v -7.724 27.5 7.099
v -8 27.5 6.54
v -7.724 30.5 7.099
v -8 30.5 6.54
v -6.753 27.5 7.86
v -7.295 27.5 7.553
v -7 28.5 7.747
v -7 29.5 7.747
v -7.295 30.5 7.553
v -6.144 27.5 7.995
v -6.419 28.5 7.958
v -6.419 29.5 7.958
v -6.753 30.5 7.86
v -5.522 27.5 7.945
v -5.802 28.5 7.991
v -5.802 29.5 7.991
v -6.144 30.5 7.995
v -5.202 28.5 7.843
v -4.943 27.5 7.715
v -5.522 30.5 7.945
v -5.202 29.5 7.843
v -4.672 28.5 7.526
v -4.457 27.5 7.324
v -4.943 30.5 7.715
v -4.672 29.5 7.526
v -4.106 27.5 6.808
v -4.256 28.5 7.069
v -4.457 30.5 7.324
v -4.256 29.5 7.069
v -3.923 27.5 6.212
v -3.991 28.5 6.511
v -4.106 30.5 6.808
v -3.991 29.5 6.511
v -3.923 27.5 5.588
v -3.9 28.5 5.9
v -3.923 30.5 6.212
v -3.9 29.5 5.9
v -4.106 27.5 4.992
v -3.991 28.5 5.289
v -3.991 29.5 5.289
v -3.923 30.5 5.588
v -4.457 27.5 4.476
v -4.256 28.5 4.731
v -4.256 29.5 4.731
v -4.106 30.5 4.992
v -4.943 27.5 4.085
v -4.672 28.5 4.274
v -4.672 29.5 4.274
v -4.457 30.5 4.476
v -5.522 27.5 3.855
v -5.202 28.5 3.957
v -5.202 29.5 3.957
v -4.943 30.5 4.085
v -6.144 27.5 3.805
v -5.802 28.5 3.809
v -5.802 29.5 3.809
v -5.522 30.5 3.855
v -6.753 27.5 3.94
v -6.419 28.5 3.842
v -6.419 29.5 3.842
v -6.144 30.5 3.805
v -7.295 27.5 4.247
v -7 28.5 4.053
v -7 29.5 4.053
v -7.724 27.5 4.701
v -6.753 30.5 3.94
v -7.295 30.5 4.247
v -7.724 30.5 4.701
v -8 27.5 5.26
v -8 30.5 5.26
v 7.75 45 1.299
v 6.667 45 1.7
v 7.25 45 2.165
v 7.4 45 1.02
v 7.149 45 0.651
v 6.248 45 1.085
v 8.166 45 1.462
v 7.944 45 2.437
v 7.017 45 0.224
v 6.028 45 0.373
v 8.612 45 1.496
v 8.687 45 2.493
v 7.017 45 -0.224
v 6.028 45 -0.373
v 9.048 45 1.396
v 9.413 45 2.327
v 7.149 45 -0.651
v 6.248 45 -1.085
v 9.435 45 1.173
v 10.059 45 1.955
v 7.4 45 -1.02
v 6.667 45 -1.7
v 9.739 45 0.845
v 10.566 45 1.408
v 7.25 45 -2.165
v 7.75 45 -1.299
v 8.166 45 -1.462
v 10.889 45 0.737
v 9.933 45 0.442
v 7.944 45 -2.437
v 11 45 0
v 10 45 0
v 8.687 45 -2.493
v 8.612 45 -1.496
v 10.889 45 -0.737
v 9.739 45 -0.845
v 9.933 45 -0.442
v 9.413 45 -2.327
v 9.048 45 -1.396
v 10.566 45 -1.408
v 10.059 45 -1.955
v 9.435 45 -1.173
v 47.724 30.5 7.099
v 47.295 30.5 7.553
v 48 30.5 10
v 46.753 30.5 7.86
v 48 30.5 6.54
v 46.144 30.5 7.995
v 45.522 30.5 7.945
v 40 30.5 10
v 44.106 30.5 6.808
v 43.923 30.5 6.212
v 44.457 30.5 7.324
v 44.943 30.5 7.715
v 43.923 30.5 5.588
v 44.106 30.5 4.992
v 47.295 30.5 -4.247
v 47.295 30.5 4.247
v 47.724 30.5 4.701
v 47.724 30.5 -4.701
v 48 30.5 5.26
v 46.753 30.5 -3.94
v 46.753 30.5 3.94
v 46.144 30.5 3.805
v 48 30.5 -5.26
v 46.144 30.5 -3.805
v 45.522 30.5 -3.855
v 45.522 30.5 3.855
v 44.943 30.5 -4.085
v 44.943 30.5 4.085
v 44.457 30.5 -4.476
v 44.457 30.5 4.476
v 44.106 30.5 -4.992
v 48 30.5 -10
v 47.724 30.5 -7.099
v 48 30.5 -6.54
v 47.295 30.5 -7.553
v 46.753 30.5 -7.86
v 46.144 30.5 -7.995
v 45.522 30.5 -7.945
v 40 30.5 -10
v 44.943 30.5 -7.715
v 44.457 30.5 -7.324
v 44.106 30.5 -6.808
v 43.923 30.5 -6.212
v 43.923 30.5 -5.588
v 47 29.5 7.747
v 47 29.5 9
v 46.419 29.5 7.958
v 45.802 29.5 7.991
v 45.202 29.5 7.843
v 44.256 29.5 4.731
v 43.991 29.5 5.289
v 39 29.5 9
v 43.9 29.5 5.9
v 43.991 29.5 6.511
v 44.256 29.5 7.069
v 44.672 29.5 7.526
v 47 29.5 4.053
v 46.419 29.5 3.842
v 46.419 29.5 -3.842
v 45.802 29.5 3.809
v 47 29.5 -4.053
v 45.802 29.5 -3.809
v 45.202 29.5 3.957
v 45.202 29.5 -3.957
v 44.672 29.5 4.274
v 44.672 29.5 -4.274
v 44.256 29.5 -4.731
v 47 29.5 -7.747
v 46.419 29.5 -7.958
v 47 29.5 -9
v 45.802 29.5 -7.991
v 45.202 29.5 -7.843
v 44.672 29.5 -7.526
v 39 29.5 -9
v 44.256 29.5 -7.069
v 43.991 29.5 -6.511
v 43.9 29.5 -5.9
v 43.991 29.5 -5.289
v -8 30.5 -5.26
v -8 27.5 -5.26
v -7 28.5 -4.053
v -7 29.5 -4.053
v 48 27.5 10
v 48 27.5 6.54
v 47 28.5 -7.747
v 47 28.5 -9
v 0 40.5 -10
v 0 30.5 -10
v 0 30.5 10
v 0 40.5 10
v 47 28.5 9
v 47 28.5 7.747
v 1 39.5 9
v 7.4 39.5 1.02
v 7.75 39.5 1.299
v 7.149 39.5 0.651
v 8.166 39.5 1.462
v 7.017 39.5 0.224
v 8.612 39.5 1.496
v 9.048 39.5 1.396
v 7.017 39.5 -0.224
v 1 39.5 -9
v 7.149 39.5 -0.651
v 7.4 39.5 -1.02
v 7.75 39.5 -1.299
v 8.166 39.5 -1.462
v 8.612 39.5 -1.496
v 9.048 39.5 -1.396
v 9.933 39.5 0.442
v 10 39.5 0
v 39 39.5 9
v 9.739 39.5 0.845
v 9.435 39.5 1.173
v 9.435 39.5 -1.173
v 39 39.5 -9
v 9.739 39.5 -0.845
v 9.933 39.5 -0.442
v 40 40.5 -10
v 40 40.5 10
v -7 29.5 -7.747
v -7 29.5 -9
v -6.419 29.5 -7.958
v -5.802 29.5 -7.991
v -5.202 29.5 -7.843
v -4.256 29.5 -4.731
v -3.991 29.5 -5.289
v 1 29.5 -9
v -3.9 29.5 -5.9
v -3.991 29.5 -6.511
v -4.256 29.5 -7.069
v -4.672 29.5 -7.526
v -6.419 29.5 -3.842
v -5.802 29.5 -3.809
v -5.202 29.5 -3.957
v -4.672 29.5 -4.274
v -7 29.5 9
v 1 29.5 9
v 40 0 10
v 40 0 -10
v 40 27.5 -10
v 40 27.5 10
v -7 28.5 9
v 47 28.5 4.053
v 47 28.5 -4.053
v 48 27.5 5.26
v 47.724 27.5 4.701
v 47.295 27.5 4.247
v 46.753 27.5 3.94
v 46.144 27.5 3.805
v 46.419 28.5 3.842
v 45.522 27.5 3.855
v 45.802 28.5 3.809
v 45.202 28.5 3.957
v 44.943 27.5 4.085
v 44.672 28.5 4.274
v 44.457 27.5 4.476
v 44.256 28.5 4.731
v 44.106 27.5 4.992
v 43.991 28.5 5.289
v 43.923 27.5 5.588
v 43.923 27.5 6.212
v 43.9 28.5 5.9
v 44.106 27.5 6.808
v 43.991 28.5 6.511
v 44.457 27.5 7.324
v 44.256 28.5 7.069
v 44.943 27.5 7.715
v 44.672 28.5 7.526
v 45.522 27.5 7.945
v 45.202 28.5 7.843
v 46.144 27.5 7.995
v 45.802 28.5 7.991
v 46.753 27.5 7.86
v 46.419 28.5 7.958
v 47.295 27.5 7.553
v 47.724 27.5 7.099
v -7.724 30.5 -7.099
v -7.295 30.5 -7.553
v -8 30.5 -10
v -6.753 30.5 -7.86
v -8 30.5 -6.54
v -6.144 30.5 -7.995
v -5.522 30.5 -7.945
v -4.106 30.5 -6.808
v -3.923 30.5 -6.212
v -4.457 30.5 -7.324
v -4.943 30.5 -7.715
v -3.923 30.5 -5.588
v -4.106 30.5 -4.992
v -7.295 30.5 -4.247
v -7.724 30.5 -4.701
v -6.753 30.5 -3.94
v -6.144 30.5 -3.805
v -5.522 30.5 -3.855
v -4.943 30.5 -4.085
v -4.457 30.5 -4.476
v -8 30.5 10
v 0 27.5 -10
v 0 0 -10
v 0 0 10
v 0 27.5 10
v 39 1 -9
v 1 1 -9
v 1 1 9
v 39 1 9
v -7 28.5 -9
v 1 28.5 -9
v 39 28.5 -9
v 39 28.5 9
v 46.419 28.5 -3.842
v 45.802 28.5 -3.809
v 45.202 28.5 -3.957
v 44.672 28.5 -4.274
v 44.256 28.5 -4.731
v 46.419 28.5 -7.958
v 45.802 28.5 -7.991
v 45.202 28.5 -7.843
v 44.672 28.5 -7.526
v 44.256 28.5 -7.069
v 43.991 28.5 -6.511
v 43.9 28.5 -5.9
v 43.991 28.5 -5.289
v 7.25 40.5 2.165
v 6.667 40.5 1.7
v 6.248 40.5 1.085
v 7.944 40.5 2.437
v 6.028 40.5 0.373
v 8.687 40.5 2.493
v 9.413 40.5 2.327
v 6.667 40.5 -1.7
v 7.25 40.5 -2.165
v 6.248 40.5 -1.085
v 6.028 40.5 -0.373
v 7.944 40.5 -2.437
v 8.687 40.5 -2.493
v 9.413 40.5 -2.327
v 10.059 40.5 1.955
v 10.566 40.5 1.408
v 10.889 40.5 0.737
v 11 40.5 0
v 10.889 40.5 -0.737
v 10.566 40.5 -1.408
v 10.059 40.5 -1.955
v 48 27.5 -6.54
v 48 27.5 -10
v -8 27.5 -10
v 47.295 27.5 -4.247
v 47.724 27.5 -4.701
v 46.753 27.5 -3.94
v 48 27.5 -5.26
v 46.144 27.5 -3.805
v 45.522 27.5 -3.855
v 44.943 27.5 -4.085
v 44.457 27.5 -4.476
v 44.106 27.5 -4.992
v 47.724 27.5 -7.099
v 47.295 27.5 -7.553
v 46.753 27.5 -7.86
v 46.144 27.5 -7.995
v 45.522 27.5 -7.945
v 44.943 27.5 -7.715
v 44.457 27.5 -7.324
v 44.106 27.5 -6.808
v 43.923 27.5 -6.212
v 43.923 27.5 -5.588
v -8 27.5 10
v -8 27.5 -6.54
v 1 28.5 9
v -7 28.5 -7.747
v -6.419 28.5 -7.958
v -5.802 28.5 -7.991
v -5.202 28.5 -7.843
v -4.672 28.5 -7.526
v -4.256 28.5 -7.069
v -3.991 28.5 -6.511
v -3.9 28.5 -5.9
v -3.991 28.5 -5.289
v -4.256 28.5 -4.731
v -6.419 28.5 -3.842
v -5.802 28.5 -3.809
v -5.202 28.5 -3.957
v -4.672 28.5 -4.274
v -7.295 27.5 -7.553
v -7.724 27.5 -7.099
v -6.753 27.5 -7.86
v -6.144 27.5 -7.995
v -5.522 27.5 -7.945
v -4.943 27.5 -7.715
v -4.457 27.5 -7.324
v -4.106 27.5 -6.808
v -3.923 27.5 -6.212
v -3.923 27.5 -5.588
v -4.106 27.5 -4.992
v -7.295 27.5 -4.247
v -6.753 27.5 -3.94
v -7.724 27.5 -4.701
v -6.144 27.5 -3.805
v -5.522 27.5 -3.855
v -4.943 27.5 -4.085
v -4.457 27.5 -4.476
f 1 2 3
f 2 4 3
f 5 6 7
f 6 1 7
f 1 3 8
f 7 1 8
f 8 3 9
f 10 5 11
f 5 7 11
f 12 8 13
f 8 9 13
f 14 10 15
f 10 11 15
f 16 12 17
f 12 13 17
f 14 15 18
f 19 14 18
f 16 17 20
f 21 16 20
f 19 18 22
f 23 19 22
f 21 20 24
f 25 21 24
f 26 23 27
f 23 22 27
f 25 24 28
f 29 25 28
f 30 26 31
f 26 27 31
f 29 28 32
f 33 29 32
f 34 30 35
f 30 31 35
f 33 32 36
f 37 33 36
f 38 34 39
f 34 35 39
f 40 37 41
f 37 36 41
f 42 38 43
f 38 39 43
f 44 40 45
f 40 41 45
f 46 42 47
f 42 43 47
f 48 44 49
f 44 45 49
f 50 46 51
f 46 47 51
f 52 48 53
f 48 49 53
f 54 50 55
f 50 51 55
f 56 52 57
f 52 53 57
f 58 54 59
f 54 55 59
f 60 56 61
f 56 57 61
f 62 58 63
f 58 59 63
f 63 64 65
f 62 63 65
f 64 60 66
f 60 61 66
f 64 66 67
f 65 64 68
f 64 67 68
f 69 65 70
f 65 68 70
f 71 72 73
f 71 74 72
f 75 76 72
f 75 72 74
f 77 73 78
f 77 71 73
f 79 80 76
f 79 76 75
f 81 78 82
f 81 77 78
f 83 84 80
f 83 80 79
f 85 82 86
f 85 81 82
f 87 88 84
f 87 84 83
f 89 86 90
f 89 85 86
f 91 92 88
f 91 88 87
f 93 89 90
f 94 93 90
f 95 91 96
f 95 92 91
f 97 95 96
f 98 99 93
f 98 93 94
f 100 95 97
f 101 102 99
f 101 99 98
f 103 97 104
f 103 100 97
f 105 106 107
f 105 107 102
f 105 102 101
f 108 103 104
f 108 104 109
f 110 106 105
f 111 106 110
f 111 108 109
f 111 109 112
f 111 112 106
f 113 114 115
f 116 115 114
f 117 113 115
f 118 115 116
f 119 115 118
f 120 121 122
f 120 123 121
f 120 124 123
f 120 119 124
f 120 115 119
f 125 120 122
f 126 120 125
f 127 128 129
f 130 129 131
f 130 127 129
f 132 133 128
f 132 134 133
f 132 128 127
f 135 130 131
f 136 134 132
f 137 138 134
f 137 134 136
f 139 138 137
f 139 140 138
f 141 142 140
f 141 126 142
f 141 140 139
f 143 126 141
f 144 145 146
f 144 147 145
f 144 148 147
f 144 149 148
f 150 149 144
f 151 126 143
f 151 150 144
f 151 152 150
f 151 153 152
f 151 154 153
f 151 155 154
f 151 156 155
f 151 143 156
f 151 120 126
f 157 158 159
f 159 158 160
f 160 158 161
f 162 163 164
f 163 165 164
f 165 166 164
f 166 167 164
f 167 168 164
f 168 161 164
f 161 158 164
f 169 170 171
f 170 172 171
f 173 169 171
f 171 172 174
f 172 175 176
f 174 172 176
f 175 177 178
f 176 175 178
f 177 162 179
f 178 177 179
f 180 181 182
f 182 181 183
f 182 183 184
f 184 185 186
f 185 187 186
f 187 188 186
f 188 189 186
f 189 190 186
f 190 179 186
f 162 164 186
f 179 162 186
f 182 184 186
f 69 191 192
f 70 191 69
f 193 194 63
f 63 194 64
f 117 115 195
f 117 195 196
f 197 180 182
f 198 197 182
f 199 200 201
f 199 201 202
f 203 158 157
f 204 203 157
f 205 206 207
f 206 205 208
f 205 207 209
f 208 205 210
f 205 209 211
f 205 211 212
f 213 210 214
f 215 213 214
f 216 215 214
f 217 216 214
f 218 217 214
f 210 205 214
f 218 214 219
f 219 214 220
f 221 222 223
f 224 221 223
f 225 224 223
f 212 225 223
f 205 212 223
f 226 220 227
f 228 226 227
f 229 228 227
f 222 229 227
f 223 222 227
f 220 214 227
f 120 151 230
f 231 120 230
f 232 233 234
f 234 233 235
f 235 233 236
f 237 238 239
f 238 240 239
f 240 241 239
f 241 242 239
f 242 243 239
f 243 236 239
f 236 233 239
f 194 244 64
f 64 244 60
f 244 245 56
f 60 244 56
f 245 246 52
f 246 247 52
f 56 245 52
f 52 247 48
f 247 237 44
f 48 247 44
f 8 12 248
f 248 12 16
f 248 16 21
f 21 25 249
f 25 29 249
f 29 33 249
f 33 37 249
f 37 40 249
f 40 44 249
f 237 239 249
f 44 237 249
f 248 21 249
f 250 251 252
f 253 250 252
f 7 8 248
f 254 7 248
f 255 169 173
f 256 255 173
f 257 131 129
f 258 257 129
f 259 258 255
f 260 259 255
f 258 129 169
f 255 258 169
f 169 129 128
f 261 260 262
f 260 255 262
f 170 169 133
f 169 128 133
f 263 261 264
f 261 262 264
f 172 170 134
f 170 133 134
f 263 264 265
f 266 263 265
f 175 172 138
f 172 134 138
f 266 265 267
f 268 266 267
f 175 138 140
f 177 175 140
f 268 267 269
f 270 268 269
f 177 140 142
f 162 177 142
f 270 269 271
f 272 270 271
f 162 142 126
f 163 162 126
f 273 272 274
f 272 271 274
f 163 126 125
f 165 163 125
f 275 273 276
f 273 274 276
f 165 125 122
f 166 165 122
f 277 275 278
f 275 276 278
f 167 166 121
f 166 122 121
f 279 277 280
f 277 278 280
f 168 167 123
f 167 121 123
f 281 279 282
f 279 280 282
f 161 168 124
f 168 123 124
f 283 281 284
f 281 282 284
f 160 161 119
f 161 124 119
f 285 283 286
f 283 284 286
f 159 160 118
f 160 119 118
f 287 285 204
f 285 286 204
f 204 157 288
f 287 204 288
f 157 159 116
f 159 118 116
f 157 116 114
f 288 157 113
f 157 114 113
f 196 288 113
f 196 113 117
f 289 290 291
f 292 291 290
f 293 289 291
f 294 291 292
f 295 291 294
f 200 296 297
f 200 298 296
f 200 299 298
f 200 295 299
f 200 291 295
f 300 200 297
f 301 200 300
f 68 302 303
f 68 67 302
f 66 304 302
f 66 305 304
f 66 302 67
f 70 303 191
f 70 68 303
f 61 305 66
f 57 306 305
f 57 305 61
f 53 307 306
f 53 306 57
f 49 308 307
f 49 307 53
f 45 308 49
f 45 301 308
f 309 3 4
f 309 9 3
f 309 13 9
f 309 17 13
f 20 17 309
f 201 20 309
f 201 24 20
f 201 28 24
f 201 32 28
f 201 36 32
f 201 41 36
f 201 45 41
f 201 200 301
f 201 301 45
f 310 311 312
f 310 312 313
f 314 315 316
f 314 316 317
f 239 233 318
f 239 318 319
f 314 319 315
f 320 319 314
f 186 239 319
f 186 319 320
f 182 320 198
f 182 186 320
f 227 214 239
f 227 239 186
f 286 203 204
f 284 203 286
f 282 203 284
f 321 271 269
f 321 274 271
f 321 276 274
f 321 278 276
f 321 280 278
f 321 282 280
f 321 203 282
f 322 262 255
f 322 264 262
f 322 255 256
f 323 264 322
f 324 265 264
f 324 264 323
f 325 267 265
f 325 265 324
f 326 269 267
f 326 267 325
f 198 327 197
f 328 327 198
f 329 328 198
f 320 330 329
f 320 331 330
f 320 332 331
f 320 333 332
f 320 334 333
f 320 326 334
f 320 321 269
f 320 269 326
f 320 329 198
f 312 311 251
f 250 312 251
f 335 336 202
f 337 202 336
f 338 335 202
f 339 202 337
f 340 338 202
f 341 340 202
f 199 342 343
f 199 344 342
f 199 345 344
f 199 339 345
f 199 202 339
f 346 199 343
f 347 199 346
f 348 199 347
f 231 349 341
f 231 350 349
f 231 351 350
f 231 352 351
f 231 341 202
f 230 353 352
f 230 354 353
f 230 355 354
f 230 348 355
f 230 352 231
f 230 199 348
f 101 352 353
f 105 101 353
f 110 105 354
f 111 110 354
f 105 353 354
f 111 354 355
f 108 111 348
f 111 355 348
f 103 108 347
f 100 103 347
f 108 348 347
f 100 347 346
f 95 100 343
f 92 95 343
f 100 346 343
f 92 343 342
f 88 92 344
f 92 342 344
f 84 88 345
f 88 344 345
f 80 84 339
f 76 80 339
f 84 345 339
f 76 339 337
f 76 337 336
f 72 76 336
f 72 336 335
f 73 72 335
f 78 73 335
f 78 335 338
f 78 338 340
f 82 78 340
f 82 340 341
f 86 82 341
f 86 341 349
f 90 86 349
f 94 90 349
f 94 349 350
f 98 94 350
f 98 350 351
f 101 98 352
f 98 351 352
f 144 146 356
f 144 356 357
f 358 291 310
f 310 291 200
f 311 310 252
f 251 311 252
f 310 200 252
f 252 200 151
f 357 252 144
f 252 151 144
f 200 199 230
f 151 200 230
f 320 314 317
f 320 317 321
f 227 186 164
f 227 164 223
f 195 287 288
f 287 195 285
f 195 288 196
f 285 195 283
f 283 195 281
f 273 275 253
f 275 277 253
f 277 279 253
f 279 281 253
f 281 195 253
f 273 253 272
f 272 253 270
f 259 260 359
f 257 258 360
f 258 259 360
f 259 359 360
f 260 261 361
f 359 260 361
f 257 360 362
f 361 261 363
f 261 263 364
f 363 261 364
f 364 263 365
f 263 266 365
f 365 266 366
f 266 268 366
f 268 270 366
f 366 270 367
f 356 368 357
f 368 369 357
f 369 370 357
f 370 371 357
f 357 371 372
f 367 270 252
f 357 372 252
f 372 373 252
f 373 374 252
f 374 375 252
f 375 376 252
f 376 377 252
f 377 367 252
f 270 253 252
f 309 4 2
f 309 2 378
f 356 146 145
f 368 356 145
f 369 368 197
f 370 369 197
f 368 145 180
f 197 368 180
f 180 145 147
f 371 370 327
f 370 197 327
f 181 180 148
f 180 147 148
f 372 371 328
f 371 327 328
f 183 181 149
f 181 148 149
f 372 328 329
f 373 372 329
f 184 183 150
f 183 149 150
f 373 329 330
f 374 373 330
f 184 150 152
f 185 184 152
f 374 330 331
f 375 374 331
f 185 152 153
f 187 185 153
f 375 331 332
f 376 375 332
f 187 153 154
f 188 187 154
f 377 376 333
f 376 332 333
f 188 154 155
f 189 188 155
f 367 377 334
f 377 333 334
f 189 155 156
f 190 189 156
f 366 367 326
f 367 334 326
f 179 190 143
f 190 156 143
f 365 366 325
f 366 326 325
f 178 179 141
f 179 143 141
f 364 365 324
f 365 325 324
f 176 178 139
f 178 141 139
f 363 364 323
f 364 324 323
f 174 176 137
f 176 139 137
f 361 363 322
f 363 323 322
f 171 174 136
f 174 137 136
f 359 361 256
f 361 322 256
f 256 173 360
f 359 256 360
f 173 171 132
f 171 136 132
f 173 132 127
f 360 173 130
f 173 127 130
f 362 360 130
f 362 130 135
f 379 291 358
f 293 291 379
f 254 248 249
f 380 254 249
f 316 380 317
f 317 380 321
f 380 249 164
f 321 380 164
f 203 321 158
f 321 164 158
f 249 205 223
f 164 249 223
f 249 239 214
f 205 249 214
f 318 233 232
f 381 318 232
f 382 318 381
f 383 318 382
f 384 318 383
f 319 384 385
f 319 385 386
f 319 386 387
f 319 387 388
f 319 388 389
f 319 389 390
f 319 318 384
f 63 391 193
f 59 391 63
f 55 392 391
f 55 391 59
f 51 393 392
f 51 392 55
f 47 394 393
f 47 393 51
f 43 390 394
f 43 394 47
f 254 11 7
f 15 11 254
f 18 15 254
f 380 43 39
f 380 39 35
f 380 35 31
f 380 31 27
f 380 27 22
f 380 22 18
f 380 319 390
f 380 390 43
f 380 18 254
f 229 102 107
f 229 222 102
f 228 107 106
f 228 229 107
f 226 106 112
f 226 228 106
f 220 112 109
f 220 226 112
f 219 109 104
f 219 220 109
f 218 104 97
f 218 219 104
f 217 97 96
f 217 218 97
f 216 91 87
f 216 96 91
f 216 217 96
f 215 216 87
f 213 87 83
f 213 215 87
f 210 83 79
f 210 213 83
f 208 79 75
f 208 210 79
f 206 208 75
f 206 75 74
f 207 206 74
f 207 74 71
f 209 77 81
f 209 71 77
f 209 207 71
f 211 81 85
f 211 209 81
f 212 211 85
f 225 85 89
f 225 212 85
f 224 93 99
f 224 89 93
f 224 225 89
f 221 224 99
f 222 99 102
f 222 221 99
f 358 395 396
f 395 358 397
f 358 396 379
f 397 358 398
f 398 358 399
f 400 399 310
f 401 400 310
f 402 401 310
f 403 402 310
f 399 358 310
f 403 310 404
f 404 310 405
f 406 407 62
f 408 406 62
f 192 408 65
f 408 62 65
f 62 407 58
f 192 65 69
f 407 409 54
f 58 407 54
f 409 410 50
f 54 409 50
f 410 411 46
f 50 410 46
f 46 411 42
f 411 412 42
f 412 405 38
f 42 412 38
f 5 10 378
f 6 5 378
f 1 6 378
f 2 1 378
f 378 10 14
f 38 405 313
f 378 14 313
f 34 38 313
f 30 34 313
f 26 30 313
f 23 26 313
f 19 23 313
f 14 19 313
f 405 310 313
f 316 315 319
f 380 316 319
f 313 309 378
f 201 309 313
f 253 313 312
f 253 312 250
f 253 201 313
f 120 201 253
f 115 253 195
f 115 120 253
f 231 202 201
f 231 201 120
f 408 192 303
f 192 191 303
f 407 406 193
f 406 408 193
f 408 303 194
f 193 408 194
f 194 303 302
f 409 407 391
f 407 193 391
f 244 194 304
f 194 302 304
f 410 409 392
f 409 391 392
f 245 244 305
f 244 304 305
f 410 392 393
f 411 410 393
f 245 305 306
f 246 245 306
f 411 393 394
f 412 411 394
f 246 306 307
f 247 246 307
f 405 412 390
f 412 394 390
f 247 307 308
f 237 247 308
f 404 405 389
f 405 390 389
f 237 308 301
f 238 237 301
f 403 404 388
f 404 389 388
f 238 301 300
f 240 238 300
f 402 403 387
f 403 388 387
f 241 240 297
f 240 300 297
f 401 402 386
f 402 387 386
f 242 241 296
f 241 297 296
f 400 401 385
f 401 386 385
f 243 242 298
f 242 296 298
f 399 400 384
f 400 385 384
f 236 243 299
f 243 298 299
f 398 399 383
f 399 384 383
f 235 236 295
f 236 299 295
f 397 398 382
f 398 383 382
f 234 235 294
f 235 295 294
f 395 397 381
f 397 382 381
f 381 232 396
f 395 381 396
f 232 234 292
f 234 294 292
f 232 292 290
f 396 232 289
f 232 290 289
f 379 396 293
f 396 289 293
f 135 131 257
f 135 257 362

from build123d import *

# Parameters (mm, degrees)
BOSS_EXTRUDE1_DEPTH      = 10
BOSS_EXTRUDE1_DEPTH_BACK = 10
SKETCH1_W                = 40
SKETCH1_H                = 40.5
SKETCH2_W                = 20
SKETCH2_H                = 3
BOSS_EXTRUDE2_DEPTH      = 8
SKETCH3_W                = 20
SKETCH3_H                = 3
BOSS_EXTRUDE3_DEPTH      = 8
SKETCH4_R                = 2.5
BOSS_EXTRUDE4_DEPTH      = 4.5
SHELL1_T                 = -1
SKETCH5_R                = 2.1
CUT_EXTRUDE1_DEPTH       = 10
SKETCH6_R                = 2.1
CUT_EXTRUDE2_DEPTH       = 10


with BuildPart() as part:
    # Sketch1 → Boss-Extrude1 (new, two sides: drawn at the far end of the back side and taken through both)
    with BuildSketch(Plane.XY.offset(-BOSS_EXTRUDE1_DEPTH_BACK)):
        with Locations((20, 20.25)):
            Rectangle(SKETCH1_W, SKETCH1_H)
    extrude(amount=BOSS_EXTRUDE1_DEPTH + BOSS_EXTRUDE1_DEPTH_BACK)

    # Sketch2 → Boss-Extrude2 (add)
    with BuildSketch(Plane(origin=(40, 0, 0), x_dir=(0, 0, -1), z_dir=(1, 0, 0))):
        with Locations((0, 29)):
            Rectangle(SKETCH2_W, SKETCH2_H)
    extrude(amount=BOSS_EXTRUDE2_DEPTH)

    # Sketch3 → Boss-Extrude3 (add)
    with BuildSketch(Plane.ZY):
        with Locations((0, 29)):
            Rectangle(SKETCH3_W, SKETCH3_H)
    extrude(amount=BOSS_EXTRUDE3_DEPTH)

    # Sketch4 → Boss-Extrude4 (add)
    with BuildSketch(Plane(origin=(0, 40.5, 0), x_dir=(1, 0, 0), z_dir=(0, 1, 0))):
        with Locations((8.5, 0)):
            Circle(SKETCH4_R)
    extrude(amount=BOSS_EXTRUDE4_DEPTH)

    # Shell1
    shell1_openings = [part.faces().sort_by_distance(p)[0] for p in [
        (8.5, 45, 0),
    ]]
    offset(amount=SHELL1_T, openings=shell1_openings, kind=Kind.INTERSECTION)

    # Sketch5 → Cut-Extrude1 (cut)
    with BuildSketch(Plane(origin=(0, 30.5, 0), x_dir=(1, 0, 0), z_dir=(0, 1, 0))):
        with Locations((-6, 5.9)):
            Circle(SKETCH5_R)
        with Locations((-6, -5.9)):
            Circle(SKETCH5_R)
    extrude(amount=-CUT_EXTRUDE1_DEPTH, mode=Mode.SUBTRACT)

    # Sketch6 → Cut-Extrude2 (cut)
    with BuildSketch(Plane(origin=(0, 30.5, 0), x_dir=(1, 0, 0), z_dir=(0, 1, 0))):
        with Locations((46, 5.9)):
            Circle(SKETCH6_R)
        with Locations((46, -5.9)):
            Circle(SKETCH6_R)
    extrude(amount=-CUT_EXTRUDE2_DEPTH, mode=Mode.SUBTRACT)


solid = part.part
